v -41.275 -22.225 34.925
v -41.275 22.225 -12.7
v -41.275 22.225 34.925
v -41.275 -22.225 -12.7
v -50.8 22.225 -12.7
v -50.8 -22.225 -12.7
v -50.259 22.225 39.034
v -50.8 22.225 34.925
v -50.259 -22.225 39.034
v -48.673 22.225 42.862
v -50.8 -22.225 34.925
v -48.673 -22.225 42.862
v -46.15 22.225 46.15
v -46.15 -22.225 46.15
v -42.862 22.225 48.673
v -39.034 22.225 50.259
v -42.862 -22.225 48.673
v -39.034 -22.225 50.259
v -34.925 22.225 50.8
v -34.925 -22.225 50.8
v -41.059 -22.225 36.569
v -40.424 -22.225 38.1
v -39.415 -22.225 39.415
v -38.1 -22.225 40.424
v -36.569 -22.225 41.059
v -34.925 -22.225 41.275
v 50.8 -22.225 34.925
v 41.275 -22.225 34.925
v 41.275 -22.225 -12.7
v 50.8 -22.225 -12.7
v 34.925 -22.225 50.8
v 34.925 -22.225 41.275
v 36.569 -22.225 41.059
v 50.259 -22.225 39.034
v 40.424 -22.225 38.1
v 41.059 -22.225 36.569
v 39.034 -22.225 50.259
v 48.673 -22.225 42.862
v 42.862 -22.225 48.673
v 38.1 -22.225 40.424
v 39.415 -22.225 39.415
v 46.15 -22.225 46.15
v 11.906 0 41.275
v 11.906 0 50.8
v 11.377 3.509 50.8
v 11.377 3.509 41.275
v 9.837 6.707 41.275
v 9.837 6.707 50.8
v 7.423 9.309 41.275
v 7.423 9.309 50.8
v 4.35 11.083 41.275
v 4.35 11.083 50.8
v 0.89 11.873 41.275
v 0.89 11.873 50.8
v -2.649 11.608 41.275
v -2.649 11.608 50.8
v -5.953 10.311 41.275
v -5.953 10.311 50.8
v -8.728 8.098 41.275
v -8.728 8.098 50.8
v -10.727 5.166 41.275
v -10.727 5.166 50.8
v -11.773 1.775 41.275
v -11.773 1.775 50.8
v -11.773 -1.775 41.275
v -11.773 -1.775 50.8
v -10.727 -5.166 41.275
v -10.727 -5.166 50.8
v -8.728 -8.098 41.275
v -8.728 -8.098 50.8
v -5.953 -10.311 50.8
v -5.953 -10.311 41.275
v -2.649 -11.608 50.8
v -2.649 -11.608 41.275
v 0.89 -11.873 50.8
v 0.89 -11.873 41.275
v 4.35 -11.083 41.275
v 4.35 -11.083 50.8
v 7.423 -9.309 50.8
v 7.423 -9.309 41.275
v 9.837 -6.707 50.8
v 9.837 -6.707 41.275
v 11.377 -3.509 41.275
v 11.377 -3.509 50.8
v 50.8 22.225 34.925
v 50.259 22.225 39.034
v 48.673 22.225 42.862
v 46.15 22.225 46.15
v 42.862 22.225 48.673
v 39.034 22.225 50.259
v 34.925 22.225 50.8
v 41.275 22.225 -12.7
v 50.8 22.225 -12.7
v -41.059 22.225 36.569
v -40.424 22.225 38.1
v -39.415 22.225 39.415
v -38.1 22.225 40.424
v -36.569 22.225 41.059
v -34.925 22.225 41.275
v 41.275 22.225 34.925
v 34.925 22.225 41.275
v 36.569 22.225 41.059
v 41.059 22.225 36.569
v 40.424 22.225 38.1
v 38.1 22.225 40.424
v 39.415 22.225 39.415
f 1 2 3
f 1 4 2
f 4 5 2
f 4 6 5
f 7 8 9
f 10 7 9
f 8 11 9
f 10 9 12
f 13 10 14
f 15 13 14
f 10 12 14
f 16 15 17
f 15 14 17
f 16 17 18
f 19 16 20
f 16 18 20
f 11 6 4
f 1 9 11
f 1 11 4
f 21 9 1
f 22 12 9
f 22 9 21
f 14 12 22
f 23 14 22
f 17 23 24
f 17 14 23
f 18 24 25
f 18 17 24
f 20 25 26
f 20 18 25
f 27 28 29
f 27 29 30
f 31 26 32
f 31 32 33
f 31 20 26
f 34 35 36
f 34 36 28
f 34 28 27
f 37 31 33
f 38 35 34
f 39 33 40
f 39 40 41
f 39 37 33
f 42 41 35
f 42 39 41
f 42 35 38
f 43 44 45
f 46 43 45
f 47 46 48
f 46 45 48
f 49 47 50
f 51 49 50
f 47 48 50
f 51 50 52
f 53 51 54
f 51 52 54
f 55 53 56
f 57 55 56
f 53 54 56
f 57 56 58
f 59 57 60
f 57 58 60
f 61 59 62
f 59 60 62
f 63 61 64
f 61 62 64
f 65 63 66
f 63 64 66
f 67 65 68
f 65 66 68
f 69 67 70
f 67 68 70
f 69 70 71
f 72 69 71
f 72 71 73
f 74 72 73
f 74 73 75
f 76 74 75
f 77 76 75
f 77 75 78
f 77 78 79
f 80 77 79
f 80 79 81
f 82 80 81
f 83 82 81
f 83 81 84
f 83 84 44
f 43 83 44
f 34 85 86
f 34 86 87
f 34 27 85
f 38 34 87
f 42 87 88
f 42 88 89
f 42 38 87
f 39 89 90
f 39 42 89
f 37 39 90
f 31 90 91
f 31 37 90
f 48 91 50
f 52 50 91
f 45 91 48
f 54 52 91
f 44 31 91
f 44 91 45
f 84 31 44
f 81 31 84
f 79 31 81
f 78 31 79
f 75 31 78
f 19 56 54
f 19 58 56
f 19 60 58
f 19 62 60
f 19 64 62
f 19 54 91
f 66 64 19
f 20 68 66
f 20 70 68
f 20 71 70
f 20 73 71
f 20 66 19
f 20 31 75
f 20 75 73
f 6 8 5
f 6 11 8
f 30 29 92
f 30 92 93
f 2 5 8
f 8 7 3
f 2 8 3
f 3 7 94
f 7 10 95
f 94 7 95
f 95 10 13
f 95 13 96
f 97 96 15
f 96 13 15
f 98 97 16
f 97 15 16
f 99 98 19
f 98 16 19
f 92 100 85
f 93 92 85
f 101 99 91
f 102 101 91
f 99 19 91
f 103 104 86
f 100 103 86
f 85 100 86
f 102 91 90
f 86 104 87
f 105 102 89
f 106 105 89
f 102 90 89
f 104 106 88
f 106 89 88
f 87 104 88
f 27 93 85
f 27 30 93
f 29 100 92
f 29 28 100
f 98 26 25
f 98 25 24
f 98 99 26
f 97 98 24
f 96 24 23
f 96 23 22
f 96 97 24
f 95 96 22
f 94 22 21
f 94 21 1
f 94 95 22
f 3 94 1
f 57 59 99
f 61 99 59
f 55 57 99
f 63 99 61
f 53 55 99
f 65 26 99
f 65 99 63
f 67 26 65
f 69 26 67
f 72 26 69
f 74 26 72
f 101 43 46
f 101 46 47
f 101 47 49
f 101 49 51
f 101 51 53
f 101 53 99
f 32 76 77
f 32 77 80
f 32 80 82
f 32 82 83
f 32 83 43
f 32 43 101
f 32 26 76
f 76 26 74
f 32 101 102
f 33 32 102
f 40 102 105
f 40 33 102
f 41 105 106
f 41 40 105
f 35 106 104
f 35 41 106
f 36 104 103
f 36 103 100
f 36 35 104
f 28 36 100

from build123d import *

# Parameters (mm, degrees)
F1_DEPTH = 22.225
F2_R     = 6.35
F3_R     = 15.875
F4_R     = 11.90625
F5_DEPTH = 25.4


with BuildPart() as f1:
    # F0 (on Front) → F1 (new body, symmetric)
    with BuildSketch(Plane.XZ):
        Polygon((-41.275, 41.275), (41.275, 41.275), (41.275, -12.7), (50.8, -12.7), (50.8, 50.8), (41.275, 50.8), (-41.275, 50.8), (-50.8, 50.8), (-50.8, -12.7), (-41.275, -12.7), align=None)
    extrude(amount=F1_DEPTH, both=True)

    # F2
    f2_edges = [f1.edges().sort_by_distance(p)[0] for p in [
        (-41.275, 0, 41.275),
        (41.275, 0, 41.275),
    ]]
    fillet(f2_edges, radius=F2_R)

    # F3
    f3_edges = [f1.edges().sort_by_distance(p)[0] for p in [
        (50.8, 0, 50.8),
        (-50.8, 0, 50.8),
    ]]
    fillet(f3_edges, radius=F3_R)

    # F4 (on face) → F5 (cut)
    with BuildSketch(Plane.XY.offset(50.8)):
        Circle(F4_R)
    extrude(amount=-F5_DEPTH, mode=Mode.SUBTRACT)


solid = f1.part
